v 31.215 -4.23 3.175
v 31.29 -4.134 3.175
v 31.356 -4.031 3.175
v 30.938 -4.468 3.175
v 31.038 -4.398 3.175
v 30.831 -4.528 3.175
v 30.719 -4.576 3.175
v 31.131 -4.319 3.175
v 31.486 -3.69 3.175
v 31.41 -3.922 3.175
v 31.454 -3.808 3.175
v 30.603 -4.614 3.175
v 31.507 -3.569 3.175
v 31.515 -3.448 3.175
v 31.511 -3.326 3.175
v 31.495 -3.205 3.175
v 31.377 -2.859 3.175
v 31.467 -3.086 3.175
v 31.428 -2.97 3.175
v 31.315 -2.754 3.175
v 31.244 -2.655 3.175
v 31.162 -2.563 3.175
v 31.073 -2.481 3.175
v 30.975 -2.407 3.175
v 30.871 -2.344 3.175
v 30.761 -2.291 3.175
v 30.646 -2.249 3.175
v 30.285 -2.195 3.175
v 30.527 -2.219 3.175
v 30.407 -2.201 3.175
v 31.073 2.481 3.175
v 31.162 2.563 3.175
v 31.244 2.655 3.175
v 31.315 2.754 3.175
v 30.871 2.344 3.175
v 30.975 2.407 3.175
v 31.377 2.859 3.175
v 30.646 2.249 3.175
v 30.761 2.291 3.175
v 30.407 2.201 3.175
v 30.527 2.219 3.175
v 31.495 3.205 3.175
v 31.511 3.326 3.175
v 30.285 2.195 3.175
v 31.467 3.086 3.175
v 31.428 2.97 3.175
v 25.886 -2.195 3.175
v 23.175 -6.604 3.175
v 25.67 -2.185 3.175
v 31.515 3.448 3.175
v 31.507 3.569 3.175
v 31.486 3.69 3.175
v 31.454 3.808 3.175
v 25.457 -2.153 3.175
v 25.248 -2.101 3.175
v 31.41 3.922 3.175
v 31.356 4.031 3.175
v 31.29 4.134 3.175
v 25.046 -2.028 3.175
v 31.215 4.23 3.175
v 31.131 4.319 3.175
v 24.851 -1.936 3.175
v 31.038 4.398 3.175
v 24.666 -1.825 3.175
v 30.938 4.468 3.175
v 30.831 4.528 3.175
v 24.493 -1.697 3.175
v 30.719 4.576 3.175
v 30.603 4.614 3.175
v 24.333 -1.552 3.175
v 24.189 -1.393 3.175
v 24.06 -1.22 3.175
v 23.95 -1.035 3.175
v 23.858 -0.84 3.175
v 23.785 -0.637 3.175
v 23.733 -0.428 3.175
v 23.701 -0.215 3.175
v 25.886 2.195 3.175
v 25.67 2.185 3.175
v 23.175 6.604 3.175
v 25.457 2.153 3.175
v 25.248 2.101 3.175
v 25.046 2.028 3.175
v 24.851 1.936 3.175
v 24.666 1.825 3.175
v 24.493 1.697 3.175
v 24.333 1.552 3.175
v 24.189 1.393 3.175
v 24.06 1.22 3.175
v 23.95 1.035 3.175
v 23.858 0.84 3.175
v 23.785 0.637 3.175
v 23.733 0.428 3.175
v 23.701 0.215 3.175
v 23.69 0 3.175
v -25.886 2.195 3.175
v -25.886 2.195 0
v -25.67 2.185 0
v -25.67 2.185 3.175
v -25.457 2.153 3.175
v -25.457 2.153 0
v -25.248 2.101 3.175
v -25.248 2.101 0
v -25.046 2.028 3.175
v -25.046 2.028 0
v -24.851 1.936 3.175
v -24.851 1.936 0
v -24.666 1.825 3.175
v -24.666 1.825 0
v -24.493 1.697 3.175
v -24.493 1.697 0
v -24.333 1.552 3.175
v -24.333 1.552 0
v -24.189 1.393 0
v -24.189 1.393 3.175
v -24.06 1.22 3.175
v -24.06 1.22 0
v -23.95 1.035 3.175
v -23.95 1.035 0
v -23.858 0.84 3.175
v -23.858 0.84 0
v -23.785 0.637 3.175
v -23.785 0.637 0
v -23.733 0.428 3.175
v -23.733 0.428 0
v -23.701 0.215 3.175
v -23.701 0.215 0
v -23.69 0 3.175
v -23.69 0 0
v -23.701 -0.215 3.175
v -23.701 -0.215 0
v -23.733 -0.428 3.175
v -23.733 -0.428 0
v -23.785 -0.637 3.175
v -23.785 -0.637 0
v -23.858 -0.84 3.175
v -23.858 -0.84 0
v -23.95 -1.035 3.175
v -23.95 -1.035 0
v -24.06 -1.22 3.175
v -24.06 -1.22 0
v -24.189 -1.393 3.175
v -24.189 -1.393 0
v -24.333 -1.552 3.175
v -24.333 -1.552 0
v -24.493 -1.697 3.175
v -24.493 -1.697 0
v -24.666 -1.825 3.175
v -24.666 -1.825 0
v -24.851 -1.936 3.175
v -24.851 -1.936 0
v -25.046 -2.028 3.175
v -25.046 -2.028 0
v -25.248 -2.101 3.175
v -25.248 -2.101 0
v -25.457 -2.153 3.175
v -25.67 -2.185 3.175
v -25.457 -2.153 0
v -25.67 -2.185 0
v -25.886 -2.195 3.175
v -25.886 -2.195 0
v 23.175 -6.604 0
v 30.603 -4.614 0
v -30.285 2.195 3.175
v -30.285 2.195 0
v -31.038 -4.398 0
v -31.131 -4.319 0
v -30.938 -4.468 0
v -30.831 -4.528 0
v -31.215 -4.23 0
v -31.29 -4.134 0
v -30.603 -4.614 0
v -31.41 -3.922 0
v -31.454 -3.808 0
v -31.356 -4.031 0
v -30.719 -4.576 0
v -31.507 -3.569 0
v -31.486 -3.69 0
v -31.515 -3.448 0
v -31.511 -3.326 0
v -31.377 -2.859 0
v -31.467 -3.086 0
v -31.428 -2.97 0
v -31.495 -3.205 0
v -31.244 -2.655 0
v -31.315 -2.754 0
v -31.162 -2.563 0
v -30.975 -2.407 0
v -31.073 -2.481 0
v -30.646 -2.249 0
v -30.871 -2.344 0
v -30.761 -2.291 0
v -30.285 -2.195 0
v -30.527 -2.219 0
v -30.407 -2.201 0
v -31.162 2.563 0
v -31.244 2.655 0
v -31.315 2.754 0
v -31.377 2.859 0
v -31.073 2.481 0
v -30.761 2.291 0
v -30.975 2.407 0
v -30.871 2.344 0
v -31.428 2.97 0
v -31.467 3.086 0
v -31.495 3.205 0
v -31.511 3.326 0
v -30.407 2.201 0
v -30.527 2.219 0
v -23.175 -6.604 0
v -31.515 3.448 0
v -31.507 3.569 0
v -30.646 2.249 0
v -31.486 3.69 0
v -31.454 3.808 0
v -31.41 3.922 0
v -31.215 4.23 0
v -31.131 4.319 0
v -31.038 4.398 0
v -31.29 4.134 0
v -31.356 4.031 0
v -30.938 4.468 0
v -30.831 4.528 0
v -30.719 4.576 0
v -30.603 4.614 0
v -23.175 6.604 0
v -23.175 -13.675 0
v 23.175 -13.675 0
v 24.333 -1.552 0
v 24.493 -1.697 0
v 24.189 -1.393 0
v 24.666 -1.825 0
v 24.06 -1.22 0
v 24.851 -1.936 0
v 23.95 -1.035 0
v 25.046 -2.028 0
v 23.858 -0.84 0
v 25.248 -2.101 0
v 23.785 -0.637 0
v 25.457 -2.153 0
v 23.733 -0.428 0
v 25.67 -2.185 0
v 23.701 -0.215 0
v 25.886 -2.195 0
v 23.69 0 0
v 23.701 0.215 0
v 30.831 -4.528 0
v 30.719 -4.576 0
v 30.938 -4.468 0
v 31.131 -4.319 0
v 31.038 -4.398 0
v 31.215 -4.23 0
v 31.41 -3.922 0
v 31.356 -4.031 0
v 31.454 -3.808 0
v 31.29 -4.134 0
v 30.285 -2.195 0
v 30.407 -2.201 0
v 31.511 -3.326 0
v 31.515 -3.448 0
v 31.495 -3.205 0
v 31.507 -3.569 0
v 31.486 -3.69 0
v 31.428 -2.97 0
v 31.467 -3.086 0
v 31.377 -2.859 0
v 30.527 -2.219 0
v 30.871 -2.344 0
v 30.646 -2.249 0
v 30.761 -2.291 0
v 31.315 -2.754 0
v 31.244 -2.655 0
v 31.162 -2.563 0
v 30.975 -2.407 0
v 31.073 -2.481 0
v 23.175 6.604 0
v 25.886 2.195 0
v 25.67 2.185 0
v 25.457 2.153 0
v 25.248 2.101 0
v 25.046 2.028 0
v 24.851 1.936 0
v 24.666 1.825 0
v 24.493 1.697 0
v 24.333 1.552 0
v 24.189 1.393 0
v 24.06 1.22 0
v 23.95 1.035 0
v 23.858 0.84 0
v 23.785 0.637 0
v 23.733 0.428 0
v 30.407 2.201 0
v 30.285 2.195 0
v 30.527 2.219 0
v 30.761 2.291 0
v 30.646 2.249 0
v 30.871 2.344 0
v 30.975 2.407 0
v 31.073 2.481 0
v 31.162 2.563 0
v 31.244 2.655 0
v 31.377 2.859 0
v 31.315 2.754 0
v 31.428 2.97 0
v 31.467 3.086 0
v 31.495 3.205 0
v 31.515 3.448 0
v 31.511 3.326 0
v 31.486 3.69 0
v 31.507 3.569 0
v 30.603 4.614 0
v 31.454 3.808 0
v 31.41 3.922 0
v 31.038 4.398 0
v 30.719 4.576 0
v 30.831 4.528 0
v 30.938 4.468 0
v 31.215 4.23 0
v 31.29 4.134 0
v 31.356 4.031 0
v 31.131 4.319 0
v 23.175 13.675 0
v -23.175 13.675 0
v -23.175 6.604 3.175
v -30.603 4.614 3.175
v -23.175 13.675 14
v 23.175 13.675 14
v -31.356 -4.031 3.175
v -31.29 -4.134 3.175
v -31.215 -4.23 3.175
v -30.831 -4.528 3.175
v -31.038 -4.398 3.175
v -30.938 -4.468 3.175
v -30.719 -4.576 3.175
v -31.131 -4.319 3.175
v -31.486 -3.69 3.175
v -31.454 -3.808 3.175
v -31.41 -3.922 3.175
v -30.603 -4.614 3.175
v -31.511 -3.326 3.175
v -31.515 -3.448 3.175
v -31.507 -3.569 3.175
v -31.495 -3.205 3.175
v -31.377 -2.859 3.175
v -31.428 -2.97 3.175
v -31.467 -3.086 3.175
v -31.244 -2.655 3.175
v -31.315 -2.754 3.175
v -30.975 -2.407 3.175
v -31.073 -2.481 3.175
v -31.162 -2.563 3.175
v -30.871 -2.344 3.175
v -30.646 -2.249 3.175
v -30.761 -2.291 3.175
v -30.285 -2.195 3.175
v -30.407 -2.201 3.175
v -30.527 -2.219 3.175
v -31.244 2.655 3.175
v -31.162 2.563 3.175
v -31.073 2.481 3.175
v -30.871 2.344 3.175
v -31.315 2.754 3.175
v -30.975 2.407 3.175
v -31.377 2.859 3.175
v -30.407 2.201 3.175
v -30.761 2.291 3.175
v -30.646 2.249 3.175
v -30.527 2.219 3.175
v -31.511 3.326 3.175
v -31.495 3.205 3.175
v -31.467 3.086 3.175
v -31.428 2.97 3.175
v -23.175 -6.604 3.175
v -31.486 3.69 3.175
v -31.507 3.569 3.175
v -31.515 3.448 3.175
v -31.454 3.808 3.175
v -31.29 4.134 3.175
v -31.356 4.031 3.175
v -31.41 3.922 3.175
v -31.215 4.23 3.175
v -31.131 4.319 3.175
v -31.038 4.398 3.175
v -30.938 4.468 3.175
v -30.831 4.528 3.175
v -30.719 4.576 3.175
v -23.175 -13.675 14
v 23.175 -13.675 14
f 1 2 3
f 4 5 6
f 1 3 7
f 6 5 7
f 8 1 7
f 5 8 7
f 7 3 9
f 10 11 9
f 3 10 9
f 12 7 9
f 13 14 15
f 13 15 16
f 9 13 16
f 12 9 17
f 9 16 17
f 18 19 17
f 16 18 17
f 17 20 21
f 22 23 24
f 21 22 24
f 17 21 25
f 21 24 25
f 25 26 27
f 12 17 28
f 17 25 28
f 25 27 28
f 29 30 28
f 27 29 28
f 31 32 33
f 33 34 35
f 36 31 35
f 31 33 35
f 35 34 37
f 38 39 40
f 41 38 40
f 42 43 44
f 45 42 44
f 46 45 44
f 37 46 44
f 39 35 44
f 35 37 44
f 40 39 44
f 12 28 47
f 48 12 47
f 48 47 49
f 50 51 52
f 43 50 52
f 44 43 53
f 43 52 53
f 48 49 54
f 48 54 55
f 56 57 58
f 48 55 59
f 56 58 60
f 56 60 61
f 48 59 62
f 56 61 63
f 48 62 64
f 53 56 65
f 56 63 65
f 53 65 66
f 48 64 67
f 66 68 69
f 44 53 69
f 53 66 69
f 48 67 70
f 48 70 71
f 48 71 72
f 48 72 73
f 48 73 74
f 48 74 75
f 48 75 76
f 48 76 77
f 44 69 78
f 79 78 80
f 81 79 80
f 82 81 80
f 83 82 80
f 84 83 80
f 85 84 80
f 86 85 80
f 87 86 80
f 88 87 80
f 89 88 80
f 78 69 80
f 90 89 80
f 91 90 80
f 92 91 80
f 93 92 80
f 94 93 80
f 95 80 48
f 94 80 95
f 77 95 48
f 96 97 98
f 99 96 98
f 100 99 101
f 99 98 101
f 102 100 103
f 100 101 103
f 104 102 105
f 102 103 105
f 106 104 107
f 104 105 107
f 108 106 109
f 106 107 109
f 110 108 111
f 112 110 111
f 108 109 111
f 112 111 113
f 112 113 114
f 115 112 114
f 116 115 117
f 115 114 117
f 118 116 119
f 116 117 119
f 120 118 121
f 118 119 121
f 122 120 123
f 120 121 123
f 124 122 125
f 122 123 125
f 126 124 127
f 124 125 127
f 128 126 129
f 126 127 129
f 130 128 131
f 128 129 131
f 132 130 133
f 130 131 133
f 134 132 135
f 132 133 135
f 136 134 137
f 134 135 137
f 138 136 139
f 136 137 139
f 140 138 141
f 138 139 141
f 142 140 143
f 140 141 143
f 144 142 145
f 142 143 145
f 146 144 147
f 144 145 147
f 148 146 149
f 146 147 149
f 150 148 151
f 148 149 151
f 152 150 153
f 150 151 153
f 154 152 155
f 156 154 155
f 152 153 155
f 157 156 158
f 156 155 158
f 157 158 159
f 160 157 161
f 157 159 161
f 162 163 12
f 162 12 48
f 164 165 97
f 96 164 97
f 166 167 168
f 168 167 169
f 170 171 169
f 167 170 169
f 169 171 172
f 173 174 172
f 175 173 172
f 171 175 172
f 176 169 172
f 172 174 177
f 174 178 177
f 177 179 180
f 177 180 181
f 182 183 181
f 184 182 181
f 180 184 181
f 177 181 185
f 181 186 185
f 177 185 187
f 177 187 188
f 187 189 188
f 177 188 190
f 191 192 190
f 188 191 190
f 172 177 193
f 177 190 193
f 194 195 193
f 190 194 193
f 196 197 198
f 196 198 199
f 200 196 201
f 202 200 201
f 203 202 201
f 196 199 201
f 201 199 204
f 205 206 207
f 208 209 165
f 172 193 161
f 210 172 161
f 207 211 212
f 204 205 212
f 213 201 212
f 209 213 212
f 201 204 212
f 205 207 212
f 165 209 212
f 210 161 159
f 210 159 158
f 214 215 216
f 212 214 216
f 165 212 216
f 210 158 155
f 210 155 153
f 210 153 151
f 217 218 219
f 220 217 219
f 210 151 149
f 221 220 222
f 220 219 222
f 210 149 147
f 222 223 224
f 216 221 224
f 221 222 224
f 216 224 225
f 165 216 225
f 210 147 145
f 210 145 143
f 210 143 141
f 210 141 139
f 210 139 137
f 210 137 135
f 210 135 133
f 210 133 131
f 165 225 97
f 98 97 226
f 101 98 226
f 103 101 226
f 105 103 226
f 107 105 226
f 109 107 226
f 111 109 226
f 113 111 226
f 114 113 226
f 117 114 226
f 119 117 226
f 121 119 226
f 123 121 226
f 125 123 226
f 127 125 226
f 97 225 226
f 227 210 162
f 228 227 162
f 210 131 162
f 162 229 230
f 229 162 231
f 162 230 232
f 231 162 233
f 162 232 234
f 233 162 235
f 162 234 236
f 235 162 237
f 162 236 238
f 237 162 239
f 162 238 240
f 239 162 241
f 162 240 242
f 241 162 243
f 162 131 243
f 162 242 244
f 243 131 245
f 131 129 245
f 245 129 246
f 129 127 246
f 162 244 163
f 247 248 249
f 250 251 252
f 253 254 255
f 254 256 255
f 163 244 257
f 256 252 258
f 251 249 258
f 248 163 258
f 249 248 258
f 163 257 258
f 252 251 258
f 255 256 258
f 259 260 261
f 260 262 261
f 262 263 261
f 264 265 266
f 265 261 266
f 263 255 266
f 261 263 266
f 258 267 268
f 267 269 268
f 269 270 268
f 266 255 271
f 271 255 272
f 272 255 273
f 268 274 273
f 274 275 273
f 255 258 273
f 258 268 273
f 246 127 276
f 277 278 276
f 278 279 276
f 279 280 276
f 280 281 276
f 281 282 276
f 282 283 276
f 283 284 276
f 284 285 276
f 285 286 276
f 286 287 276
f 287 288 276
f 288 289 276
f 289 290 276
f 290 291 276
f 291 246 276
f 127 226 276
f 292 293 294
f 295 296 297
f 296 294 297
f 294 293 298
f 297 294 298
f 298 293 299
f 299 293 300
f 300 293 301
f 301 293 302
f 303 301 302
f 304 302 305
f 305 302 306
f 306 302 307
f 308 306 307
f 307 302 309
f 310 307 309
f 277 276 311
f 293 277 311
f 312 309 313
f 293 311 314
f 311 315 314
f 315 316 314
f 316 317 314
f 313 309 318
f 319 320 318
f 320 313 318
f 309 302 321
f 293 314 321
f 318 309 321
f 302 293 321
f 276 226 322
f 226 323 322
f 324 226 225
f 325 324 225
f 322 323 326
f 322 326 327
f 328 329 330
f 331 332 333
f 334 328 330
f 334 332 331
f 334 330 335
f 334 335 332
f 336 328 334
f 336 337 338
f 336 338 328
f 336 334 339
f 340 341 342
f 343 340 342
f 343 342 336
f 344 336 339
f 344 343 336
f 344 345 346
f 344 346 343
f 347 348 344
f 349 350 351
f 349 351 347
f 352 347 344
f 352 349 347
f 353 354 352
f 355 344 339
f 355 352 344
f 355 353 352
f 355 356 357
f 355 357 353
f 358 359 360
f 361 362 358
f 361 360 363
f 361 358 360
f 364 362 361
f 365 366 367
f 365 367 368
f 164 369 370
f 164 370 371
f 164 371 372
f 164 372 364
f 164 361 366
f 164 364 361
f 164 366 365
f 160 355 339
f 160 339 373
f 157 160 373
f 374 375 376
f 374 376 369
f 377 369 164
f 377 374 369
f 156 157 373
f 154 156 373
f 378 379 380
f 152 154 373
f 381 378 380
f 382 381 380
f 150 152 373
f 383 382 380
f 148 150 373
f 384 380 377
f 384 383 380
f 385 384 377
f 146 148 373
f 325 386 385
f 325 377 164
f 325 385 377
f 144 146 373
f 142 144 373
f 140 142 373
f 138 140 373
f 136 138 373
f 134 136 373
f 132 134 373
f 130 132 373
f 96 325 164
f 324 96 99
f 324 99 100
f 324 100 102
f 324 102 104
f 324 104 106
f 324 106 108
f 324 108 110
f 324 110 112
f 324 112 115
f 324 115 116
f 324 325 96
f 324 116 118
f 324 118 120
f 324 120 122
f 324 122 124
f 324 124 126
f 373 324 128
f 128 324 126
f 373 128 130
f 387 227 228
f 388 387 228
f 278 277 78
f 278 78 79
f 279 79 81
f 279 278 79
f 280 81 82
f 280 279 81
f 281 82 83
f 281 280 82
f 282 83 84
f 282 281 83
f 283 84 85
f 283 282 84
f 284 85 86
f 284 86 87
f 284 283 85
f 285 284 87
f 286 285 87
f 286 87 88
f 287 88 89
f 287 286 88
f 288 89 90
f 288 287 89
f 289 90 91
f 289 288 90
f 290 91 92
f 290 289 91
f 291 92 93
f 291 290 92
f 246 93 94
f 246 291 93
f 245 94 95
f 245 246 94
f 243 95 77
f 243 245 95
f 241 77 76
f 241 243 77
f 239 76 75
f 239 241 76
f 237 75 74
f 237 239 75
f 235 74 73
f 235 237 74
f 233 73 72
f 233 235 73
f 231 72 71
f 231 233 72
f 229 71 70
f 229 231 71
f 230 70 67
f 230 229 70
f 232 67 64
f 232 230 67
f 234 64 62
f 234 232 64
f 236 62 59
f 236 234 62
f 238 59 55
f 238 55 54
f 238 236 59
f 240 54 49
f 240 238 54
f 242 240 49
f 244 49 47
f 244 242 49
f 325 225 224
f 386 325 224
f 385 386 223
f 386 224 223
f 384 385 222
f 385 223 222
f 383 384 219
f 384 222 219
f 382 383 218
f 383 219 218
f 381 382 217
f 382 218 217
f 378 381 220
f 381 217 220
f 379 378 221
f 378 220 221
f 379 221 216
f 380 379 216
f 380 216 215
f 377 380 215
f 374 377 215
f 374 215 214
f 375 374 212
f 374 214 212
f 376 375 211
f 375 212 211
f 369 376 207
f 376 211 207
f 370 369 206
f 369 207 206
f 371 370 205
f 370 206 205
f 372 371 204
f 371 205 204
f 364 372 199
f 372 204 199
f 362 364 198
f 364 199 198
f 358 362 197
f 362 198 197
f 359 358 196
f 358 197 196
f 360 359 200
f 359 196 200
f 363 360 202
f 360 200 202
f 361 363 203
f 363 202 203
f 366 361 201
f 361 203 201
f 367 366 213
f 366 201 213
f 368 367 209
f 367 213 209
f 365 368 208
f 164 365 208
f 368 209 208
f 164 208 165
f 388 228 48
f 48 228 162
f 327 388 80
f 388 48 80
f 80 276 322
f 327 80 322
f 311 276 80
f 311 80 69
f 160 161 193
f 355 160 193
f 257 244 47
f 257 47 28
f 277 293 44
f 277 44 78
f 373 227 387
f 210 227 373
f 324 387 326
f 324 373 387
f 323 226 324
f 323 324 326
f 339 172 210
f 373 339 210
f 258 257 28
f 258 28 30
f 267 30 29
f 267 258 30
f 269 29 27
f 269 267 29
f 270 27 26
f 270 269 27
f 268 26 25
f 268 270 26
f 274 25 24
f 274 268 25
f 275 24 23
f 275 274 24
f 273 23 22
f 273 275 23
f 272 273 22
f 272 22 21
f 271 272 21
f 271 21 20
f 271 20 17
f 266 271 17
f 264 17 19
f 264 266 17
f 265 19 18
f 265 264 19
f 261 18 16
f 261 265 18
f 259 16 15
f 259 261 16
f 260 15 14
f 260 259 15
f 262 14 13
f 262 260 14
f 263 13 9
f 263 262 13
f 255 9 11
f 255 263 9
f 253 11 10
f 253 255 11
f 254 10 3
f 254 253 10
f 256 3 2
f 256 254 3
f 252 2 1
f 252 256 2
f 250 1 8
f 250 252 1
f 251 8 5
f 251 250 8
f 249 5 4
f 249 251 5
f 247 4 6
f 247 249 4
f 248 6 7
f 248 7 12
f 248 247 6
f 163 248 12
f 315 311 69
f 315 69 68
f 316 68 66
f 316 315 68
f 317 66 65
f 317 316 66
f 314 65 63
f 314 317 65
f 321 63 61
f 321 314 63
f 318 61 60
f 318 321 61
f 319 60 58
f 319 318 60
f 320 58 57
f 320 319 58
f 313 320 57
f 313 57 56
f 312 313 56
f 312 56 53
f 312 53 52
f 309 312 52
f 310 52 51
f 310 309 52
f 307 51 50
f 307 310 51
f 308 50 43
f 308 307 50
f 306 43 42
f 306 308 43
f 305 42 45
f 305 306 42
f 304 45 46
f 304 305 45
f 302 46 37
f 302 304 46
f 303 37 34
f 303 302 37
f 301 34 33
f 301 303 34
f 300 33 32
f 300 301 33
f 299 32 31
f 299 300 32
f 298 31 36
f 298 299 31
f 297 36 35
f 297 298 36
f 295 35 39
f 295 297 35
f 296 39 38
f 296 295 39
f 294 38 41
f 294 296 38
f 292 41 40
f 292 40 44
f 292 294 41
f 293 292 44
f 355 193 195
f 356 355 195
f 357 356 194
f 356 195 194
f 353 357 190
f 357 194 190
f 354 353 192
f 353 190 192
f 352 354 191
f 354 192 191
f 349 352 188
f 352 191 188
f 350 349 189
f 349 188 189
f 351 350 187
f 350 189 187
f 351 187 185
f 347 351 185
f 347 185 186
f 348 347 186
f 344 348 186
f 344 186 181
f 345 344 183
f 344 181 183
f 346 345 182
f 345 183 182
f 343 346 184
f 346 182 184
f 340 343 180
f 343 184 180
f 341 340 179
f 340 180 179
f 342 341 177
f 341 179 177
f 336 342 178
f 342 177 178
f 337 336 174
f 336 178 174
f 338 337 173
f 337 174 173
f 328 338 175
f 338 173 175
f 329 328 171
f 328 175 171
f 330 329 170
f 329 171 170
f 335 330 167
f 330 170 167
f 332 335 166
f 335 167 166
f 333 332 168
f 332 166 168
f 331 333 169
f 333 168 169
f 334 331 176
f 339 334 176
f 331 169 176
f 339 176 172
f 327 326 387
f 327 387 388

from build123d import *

# Parameters (mm, degrees)
SKETCH1_W           = 46.35
SKETCH1_H           = 27.35
BOSS_EXTRUDE1_DEPTH = 14
BOSS_EXTRUDE2_DEPTH = 3.175


with BuildPart() as part:
    # Sketch1 → Boss-Extrude1 (new body)
    with BuildSketch(Plane.XY):
        Rectangle(SKETCH1_W, SKETCH1_H)
    extrude(amount=BOSS_EXTRUDE1_DEPTH)

    # Sketch2 → Boss-Extrude2 (add)
    with BuildSketch(Plane.XY):
        with BuildLine():
            Line((23.175, 6.604134349), (30.60317409, 4.6137611))
            ThreePointArc((30.60317409, 4.6137611), (31.504475179, 3.264868697), (30.284766137, 2.195212576))
            Line((30.284766137, 2.195212576), (25.885652609, 2.195212576))
            ThreePointArc((25.885652609, 2.195212576), (23.690440034, 0), (25.885652609, -2.195212576))
            Line((25.885652609, -2.195212576), (30.284766137, -2.195212576))
            ThreePointArc((30.284766137, -2.195212576), (31.504475179, -3.264868697), (30.60317409, -4.6137611))
            Line((30.60317409, -4.6137611), (23.175, -6.604134349))
            Line((23.175, -6.604134349), (23.175, 6.604134349))
        make_face()
    boss_extrude2 = extrude(amount=BOSS_EXTRUDE2_DEPTH)

    # Mirror1: Boss-Extrude2 across plane
    add(boss_extrude2.mirror(Plane(origin=(0, 0, 0), x_dir=(0, 0, 1), z_dir=(1, 0, 0))))


solid = part.part
